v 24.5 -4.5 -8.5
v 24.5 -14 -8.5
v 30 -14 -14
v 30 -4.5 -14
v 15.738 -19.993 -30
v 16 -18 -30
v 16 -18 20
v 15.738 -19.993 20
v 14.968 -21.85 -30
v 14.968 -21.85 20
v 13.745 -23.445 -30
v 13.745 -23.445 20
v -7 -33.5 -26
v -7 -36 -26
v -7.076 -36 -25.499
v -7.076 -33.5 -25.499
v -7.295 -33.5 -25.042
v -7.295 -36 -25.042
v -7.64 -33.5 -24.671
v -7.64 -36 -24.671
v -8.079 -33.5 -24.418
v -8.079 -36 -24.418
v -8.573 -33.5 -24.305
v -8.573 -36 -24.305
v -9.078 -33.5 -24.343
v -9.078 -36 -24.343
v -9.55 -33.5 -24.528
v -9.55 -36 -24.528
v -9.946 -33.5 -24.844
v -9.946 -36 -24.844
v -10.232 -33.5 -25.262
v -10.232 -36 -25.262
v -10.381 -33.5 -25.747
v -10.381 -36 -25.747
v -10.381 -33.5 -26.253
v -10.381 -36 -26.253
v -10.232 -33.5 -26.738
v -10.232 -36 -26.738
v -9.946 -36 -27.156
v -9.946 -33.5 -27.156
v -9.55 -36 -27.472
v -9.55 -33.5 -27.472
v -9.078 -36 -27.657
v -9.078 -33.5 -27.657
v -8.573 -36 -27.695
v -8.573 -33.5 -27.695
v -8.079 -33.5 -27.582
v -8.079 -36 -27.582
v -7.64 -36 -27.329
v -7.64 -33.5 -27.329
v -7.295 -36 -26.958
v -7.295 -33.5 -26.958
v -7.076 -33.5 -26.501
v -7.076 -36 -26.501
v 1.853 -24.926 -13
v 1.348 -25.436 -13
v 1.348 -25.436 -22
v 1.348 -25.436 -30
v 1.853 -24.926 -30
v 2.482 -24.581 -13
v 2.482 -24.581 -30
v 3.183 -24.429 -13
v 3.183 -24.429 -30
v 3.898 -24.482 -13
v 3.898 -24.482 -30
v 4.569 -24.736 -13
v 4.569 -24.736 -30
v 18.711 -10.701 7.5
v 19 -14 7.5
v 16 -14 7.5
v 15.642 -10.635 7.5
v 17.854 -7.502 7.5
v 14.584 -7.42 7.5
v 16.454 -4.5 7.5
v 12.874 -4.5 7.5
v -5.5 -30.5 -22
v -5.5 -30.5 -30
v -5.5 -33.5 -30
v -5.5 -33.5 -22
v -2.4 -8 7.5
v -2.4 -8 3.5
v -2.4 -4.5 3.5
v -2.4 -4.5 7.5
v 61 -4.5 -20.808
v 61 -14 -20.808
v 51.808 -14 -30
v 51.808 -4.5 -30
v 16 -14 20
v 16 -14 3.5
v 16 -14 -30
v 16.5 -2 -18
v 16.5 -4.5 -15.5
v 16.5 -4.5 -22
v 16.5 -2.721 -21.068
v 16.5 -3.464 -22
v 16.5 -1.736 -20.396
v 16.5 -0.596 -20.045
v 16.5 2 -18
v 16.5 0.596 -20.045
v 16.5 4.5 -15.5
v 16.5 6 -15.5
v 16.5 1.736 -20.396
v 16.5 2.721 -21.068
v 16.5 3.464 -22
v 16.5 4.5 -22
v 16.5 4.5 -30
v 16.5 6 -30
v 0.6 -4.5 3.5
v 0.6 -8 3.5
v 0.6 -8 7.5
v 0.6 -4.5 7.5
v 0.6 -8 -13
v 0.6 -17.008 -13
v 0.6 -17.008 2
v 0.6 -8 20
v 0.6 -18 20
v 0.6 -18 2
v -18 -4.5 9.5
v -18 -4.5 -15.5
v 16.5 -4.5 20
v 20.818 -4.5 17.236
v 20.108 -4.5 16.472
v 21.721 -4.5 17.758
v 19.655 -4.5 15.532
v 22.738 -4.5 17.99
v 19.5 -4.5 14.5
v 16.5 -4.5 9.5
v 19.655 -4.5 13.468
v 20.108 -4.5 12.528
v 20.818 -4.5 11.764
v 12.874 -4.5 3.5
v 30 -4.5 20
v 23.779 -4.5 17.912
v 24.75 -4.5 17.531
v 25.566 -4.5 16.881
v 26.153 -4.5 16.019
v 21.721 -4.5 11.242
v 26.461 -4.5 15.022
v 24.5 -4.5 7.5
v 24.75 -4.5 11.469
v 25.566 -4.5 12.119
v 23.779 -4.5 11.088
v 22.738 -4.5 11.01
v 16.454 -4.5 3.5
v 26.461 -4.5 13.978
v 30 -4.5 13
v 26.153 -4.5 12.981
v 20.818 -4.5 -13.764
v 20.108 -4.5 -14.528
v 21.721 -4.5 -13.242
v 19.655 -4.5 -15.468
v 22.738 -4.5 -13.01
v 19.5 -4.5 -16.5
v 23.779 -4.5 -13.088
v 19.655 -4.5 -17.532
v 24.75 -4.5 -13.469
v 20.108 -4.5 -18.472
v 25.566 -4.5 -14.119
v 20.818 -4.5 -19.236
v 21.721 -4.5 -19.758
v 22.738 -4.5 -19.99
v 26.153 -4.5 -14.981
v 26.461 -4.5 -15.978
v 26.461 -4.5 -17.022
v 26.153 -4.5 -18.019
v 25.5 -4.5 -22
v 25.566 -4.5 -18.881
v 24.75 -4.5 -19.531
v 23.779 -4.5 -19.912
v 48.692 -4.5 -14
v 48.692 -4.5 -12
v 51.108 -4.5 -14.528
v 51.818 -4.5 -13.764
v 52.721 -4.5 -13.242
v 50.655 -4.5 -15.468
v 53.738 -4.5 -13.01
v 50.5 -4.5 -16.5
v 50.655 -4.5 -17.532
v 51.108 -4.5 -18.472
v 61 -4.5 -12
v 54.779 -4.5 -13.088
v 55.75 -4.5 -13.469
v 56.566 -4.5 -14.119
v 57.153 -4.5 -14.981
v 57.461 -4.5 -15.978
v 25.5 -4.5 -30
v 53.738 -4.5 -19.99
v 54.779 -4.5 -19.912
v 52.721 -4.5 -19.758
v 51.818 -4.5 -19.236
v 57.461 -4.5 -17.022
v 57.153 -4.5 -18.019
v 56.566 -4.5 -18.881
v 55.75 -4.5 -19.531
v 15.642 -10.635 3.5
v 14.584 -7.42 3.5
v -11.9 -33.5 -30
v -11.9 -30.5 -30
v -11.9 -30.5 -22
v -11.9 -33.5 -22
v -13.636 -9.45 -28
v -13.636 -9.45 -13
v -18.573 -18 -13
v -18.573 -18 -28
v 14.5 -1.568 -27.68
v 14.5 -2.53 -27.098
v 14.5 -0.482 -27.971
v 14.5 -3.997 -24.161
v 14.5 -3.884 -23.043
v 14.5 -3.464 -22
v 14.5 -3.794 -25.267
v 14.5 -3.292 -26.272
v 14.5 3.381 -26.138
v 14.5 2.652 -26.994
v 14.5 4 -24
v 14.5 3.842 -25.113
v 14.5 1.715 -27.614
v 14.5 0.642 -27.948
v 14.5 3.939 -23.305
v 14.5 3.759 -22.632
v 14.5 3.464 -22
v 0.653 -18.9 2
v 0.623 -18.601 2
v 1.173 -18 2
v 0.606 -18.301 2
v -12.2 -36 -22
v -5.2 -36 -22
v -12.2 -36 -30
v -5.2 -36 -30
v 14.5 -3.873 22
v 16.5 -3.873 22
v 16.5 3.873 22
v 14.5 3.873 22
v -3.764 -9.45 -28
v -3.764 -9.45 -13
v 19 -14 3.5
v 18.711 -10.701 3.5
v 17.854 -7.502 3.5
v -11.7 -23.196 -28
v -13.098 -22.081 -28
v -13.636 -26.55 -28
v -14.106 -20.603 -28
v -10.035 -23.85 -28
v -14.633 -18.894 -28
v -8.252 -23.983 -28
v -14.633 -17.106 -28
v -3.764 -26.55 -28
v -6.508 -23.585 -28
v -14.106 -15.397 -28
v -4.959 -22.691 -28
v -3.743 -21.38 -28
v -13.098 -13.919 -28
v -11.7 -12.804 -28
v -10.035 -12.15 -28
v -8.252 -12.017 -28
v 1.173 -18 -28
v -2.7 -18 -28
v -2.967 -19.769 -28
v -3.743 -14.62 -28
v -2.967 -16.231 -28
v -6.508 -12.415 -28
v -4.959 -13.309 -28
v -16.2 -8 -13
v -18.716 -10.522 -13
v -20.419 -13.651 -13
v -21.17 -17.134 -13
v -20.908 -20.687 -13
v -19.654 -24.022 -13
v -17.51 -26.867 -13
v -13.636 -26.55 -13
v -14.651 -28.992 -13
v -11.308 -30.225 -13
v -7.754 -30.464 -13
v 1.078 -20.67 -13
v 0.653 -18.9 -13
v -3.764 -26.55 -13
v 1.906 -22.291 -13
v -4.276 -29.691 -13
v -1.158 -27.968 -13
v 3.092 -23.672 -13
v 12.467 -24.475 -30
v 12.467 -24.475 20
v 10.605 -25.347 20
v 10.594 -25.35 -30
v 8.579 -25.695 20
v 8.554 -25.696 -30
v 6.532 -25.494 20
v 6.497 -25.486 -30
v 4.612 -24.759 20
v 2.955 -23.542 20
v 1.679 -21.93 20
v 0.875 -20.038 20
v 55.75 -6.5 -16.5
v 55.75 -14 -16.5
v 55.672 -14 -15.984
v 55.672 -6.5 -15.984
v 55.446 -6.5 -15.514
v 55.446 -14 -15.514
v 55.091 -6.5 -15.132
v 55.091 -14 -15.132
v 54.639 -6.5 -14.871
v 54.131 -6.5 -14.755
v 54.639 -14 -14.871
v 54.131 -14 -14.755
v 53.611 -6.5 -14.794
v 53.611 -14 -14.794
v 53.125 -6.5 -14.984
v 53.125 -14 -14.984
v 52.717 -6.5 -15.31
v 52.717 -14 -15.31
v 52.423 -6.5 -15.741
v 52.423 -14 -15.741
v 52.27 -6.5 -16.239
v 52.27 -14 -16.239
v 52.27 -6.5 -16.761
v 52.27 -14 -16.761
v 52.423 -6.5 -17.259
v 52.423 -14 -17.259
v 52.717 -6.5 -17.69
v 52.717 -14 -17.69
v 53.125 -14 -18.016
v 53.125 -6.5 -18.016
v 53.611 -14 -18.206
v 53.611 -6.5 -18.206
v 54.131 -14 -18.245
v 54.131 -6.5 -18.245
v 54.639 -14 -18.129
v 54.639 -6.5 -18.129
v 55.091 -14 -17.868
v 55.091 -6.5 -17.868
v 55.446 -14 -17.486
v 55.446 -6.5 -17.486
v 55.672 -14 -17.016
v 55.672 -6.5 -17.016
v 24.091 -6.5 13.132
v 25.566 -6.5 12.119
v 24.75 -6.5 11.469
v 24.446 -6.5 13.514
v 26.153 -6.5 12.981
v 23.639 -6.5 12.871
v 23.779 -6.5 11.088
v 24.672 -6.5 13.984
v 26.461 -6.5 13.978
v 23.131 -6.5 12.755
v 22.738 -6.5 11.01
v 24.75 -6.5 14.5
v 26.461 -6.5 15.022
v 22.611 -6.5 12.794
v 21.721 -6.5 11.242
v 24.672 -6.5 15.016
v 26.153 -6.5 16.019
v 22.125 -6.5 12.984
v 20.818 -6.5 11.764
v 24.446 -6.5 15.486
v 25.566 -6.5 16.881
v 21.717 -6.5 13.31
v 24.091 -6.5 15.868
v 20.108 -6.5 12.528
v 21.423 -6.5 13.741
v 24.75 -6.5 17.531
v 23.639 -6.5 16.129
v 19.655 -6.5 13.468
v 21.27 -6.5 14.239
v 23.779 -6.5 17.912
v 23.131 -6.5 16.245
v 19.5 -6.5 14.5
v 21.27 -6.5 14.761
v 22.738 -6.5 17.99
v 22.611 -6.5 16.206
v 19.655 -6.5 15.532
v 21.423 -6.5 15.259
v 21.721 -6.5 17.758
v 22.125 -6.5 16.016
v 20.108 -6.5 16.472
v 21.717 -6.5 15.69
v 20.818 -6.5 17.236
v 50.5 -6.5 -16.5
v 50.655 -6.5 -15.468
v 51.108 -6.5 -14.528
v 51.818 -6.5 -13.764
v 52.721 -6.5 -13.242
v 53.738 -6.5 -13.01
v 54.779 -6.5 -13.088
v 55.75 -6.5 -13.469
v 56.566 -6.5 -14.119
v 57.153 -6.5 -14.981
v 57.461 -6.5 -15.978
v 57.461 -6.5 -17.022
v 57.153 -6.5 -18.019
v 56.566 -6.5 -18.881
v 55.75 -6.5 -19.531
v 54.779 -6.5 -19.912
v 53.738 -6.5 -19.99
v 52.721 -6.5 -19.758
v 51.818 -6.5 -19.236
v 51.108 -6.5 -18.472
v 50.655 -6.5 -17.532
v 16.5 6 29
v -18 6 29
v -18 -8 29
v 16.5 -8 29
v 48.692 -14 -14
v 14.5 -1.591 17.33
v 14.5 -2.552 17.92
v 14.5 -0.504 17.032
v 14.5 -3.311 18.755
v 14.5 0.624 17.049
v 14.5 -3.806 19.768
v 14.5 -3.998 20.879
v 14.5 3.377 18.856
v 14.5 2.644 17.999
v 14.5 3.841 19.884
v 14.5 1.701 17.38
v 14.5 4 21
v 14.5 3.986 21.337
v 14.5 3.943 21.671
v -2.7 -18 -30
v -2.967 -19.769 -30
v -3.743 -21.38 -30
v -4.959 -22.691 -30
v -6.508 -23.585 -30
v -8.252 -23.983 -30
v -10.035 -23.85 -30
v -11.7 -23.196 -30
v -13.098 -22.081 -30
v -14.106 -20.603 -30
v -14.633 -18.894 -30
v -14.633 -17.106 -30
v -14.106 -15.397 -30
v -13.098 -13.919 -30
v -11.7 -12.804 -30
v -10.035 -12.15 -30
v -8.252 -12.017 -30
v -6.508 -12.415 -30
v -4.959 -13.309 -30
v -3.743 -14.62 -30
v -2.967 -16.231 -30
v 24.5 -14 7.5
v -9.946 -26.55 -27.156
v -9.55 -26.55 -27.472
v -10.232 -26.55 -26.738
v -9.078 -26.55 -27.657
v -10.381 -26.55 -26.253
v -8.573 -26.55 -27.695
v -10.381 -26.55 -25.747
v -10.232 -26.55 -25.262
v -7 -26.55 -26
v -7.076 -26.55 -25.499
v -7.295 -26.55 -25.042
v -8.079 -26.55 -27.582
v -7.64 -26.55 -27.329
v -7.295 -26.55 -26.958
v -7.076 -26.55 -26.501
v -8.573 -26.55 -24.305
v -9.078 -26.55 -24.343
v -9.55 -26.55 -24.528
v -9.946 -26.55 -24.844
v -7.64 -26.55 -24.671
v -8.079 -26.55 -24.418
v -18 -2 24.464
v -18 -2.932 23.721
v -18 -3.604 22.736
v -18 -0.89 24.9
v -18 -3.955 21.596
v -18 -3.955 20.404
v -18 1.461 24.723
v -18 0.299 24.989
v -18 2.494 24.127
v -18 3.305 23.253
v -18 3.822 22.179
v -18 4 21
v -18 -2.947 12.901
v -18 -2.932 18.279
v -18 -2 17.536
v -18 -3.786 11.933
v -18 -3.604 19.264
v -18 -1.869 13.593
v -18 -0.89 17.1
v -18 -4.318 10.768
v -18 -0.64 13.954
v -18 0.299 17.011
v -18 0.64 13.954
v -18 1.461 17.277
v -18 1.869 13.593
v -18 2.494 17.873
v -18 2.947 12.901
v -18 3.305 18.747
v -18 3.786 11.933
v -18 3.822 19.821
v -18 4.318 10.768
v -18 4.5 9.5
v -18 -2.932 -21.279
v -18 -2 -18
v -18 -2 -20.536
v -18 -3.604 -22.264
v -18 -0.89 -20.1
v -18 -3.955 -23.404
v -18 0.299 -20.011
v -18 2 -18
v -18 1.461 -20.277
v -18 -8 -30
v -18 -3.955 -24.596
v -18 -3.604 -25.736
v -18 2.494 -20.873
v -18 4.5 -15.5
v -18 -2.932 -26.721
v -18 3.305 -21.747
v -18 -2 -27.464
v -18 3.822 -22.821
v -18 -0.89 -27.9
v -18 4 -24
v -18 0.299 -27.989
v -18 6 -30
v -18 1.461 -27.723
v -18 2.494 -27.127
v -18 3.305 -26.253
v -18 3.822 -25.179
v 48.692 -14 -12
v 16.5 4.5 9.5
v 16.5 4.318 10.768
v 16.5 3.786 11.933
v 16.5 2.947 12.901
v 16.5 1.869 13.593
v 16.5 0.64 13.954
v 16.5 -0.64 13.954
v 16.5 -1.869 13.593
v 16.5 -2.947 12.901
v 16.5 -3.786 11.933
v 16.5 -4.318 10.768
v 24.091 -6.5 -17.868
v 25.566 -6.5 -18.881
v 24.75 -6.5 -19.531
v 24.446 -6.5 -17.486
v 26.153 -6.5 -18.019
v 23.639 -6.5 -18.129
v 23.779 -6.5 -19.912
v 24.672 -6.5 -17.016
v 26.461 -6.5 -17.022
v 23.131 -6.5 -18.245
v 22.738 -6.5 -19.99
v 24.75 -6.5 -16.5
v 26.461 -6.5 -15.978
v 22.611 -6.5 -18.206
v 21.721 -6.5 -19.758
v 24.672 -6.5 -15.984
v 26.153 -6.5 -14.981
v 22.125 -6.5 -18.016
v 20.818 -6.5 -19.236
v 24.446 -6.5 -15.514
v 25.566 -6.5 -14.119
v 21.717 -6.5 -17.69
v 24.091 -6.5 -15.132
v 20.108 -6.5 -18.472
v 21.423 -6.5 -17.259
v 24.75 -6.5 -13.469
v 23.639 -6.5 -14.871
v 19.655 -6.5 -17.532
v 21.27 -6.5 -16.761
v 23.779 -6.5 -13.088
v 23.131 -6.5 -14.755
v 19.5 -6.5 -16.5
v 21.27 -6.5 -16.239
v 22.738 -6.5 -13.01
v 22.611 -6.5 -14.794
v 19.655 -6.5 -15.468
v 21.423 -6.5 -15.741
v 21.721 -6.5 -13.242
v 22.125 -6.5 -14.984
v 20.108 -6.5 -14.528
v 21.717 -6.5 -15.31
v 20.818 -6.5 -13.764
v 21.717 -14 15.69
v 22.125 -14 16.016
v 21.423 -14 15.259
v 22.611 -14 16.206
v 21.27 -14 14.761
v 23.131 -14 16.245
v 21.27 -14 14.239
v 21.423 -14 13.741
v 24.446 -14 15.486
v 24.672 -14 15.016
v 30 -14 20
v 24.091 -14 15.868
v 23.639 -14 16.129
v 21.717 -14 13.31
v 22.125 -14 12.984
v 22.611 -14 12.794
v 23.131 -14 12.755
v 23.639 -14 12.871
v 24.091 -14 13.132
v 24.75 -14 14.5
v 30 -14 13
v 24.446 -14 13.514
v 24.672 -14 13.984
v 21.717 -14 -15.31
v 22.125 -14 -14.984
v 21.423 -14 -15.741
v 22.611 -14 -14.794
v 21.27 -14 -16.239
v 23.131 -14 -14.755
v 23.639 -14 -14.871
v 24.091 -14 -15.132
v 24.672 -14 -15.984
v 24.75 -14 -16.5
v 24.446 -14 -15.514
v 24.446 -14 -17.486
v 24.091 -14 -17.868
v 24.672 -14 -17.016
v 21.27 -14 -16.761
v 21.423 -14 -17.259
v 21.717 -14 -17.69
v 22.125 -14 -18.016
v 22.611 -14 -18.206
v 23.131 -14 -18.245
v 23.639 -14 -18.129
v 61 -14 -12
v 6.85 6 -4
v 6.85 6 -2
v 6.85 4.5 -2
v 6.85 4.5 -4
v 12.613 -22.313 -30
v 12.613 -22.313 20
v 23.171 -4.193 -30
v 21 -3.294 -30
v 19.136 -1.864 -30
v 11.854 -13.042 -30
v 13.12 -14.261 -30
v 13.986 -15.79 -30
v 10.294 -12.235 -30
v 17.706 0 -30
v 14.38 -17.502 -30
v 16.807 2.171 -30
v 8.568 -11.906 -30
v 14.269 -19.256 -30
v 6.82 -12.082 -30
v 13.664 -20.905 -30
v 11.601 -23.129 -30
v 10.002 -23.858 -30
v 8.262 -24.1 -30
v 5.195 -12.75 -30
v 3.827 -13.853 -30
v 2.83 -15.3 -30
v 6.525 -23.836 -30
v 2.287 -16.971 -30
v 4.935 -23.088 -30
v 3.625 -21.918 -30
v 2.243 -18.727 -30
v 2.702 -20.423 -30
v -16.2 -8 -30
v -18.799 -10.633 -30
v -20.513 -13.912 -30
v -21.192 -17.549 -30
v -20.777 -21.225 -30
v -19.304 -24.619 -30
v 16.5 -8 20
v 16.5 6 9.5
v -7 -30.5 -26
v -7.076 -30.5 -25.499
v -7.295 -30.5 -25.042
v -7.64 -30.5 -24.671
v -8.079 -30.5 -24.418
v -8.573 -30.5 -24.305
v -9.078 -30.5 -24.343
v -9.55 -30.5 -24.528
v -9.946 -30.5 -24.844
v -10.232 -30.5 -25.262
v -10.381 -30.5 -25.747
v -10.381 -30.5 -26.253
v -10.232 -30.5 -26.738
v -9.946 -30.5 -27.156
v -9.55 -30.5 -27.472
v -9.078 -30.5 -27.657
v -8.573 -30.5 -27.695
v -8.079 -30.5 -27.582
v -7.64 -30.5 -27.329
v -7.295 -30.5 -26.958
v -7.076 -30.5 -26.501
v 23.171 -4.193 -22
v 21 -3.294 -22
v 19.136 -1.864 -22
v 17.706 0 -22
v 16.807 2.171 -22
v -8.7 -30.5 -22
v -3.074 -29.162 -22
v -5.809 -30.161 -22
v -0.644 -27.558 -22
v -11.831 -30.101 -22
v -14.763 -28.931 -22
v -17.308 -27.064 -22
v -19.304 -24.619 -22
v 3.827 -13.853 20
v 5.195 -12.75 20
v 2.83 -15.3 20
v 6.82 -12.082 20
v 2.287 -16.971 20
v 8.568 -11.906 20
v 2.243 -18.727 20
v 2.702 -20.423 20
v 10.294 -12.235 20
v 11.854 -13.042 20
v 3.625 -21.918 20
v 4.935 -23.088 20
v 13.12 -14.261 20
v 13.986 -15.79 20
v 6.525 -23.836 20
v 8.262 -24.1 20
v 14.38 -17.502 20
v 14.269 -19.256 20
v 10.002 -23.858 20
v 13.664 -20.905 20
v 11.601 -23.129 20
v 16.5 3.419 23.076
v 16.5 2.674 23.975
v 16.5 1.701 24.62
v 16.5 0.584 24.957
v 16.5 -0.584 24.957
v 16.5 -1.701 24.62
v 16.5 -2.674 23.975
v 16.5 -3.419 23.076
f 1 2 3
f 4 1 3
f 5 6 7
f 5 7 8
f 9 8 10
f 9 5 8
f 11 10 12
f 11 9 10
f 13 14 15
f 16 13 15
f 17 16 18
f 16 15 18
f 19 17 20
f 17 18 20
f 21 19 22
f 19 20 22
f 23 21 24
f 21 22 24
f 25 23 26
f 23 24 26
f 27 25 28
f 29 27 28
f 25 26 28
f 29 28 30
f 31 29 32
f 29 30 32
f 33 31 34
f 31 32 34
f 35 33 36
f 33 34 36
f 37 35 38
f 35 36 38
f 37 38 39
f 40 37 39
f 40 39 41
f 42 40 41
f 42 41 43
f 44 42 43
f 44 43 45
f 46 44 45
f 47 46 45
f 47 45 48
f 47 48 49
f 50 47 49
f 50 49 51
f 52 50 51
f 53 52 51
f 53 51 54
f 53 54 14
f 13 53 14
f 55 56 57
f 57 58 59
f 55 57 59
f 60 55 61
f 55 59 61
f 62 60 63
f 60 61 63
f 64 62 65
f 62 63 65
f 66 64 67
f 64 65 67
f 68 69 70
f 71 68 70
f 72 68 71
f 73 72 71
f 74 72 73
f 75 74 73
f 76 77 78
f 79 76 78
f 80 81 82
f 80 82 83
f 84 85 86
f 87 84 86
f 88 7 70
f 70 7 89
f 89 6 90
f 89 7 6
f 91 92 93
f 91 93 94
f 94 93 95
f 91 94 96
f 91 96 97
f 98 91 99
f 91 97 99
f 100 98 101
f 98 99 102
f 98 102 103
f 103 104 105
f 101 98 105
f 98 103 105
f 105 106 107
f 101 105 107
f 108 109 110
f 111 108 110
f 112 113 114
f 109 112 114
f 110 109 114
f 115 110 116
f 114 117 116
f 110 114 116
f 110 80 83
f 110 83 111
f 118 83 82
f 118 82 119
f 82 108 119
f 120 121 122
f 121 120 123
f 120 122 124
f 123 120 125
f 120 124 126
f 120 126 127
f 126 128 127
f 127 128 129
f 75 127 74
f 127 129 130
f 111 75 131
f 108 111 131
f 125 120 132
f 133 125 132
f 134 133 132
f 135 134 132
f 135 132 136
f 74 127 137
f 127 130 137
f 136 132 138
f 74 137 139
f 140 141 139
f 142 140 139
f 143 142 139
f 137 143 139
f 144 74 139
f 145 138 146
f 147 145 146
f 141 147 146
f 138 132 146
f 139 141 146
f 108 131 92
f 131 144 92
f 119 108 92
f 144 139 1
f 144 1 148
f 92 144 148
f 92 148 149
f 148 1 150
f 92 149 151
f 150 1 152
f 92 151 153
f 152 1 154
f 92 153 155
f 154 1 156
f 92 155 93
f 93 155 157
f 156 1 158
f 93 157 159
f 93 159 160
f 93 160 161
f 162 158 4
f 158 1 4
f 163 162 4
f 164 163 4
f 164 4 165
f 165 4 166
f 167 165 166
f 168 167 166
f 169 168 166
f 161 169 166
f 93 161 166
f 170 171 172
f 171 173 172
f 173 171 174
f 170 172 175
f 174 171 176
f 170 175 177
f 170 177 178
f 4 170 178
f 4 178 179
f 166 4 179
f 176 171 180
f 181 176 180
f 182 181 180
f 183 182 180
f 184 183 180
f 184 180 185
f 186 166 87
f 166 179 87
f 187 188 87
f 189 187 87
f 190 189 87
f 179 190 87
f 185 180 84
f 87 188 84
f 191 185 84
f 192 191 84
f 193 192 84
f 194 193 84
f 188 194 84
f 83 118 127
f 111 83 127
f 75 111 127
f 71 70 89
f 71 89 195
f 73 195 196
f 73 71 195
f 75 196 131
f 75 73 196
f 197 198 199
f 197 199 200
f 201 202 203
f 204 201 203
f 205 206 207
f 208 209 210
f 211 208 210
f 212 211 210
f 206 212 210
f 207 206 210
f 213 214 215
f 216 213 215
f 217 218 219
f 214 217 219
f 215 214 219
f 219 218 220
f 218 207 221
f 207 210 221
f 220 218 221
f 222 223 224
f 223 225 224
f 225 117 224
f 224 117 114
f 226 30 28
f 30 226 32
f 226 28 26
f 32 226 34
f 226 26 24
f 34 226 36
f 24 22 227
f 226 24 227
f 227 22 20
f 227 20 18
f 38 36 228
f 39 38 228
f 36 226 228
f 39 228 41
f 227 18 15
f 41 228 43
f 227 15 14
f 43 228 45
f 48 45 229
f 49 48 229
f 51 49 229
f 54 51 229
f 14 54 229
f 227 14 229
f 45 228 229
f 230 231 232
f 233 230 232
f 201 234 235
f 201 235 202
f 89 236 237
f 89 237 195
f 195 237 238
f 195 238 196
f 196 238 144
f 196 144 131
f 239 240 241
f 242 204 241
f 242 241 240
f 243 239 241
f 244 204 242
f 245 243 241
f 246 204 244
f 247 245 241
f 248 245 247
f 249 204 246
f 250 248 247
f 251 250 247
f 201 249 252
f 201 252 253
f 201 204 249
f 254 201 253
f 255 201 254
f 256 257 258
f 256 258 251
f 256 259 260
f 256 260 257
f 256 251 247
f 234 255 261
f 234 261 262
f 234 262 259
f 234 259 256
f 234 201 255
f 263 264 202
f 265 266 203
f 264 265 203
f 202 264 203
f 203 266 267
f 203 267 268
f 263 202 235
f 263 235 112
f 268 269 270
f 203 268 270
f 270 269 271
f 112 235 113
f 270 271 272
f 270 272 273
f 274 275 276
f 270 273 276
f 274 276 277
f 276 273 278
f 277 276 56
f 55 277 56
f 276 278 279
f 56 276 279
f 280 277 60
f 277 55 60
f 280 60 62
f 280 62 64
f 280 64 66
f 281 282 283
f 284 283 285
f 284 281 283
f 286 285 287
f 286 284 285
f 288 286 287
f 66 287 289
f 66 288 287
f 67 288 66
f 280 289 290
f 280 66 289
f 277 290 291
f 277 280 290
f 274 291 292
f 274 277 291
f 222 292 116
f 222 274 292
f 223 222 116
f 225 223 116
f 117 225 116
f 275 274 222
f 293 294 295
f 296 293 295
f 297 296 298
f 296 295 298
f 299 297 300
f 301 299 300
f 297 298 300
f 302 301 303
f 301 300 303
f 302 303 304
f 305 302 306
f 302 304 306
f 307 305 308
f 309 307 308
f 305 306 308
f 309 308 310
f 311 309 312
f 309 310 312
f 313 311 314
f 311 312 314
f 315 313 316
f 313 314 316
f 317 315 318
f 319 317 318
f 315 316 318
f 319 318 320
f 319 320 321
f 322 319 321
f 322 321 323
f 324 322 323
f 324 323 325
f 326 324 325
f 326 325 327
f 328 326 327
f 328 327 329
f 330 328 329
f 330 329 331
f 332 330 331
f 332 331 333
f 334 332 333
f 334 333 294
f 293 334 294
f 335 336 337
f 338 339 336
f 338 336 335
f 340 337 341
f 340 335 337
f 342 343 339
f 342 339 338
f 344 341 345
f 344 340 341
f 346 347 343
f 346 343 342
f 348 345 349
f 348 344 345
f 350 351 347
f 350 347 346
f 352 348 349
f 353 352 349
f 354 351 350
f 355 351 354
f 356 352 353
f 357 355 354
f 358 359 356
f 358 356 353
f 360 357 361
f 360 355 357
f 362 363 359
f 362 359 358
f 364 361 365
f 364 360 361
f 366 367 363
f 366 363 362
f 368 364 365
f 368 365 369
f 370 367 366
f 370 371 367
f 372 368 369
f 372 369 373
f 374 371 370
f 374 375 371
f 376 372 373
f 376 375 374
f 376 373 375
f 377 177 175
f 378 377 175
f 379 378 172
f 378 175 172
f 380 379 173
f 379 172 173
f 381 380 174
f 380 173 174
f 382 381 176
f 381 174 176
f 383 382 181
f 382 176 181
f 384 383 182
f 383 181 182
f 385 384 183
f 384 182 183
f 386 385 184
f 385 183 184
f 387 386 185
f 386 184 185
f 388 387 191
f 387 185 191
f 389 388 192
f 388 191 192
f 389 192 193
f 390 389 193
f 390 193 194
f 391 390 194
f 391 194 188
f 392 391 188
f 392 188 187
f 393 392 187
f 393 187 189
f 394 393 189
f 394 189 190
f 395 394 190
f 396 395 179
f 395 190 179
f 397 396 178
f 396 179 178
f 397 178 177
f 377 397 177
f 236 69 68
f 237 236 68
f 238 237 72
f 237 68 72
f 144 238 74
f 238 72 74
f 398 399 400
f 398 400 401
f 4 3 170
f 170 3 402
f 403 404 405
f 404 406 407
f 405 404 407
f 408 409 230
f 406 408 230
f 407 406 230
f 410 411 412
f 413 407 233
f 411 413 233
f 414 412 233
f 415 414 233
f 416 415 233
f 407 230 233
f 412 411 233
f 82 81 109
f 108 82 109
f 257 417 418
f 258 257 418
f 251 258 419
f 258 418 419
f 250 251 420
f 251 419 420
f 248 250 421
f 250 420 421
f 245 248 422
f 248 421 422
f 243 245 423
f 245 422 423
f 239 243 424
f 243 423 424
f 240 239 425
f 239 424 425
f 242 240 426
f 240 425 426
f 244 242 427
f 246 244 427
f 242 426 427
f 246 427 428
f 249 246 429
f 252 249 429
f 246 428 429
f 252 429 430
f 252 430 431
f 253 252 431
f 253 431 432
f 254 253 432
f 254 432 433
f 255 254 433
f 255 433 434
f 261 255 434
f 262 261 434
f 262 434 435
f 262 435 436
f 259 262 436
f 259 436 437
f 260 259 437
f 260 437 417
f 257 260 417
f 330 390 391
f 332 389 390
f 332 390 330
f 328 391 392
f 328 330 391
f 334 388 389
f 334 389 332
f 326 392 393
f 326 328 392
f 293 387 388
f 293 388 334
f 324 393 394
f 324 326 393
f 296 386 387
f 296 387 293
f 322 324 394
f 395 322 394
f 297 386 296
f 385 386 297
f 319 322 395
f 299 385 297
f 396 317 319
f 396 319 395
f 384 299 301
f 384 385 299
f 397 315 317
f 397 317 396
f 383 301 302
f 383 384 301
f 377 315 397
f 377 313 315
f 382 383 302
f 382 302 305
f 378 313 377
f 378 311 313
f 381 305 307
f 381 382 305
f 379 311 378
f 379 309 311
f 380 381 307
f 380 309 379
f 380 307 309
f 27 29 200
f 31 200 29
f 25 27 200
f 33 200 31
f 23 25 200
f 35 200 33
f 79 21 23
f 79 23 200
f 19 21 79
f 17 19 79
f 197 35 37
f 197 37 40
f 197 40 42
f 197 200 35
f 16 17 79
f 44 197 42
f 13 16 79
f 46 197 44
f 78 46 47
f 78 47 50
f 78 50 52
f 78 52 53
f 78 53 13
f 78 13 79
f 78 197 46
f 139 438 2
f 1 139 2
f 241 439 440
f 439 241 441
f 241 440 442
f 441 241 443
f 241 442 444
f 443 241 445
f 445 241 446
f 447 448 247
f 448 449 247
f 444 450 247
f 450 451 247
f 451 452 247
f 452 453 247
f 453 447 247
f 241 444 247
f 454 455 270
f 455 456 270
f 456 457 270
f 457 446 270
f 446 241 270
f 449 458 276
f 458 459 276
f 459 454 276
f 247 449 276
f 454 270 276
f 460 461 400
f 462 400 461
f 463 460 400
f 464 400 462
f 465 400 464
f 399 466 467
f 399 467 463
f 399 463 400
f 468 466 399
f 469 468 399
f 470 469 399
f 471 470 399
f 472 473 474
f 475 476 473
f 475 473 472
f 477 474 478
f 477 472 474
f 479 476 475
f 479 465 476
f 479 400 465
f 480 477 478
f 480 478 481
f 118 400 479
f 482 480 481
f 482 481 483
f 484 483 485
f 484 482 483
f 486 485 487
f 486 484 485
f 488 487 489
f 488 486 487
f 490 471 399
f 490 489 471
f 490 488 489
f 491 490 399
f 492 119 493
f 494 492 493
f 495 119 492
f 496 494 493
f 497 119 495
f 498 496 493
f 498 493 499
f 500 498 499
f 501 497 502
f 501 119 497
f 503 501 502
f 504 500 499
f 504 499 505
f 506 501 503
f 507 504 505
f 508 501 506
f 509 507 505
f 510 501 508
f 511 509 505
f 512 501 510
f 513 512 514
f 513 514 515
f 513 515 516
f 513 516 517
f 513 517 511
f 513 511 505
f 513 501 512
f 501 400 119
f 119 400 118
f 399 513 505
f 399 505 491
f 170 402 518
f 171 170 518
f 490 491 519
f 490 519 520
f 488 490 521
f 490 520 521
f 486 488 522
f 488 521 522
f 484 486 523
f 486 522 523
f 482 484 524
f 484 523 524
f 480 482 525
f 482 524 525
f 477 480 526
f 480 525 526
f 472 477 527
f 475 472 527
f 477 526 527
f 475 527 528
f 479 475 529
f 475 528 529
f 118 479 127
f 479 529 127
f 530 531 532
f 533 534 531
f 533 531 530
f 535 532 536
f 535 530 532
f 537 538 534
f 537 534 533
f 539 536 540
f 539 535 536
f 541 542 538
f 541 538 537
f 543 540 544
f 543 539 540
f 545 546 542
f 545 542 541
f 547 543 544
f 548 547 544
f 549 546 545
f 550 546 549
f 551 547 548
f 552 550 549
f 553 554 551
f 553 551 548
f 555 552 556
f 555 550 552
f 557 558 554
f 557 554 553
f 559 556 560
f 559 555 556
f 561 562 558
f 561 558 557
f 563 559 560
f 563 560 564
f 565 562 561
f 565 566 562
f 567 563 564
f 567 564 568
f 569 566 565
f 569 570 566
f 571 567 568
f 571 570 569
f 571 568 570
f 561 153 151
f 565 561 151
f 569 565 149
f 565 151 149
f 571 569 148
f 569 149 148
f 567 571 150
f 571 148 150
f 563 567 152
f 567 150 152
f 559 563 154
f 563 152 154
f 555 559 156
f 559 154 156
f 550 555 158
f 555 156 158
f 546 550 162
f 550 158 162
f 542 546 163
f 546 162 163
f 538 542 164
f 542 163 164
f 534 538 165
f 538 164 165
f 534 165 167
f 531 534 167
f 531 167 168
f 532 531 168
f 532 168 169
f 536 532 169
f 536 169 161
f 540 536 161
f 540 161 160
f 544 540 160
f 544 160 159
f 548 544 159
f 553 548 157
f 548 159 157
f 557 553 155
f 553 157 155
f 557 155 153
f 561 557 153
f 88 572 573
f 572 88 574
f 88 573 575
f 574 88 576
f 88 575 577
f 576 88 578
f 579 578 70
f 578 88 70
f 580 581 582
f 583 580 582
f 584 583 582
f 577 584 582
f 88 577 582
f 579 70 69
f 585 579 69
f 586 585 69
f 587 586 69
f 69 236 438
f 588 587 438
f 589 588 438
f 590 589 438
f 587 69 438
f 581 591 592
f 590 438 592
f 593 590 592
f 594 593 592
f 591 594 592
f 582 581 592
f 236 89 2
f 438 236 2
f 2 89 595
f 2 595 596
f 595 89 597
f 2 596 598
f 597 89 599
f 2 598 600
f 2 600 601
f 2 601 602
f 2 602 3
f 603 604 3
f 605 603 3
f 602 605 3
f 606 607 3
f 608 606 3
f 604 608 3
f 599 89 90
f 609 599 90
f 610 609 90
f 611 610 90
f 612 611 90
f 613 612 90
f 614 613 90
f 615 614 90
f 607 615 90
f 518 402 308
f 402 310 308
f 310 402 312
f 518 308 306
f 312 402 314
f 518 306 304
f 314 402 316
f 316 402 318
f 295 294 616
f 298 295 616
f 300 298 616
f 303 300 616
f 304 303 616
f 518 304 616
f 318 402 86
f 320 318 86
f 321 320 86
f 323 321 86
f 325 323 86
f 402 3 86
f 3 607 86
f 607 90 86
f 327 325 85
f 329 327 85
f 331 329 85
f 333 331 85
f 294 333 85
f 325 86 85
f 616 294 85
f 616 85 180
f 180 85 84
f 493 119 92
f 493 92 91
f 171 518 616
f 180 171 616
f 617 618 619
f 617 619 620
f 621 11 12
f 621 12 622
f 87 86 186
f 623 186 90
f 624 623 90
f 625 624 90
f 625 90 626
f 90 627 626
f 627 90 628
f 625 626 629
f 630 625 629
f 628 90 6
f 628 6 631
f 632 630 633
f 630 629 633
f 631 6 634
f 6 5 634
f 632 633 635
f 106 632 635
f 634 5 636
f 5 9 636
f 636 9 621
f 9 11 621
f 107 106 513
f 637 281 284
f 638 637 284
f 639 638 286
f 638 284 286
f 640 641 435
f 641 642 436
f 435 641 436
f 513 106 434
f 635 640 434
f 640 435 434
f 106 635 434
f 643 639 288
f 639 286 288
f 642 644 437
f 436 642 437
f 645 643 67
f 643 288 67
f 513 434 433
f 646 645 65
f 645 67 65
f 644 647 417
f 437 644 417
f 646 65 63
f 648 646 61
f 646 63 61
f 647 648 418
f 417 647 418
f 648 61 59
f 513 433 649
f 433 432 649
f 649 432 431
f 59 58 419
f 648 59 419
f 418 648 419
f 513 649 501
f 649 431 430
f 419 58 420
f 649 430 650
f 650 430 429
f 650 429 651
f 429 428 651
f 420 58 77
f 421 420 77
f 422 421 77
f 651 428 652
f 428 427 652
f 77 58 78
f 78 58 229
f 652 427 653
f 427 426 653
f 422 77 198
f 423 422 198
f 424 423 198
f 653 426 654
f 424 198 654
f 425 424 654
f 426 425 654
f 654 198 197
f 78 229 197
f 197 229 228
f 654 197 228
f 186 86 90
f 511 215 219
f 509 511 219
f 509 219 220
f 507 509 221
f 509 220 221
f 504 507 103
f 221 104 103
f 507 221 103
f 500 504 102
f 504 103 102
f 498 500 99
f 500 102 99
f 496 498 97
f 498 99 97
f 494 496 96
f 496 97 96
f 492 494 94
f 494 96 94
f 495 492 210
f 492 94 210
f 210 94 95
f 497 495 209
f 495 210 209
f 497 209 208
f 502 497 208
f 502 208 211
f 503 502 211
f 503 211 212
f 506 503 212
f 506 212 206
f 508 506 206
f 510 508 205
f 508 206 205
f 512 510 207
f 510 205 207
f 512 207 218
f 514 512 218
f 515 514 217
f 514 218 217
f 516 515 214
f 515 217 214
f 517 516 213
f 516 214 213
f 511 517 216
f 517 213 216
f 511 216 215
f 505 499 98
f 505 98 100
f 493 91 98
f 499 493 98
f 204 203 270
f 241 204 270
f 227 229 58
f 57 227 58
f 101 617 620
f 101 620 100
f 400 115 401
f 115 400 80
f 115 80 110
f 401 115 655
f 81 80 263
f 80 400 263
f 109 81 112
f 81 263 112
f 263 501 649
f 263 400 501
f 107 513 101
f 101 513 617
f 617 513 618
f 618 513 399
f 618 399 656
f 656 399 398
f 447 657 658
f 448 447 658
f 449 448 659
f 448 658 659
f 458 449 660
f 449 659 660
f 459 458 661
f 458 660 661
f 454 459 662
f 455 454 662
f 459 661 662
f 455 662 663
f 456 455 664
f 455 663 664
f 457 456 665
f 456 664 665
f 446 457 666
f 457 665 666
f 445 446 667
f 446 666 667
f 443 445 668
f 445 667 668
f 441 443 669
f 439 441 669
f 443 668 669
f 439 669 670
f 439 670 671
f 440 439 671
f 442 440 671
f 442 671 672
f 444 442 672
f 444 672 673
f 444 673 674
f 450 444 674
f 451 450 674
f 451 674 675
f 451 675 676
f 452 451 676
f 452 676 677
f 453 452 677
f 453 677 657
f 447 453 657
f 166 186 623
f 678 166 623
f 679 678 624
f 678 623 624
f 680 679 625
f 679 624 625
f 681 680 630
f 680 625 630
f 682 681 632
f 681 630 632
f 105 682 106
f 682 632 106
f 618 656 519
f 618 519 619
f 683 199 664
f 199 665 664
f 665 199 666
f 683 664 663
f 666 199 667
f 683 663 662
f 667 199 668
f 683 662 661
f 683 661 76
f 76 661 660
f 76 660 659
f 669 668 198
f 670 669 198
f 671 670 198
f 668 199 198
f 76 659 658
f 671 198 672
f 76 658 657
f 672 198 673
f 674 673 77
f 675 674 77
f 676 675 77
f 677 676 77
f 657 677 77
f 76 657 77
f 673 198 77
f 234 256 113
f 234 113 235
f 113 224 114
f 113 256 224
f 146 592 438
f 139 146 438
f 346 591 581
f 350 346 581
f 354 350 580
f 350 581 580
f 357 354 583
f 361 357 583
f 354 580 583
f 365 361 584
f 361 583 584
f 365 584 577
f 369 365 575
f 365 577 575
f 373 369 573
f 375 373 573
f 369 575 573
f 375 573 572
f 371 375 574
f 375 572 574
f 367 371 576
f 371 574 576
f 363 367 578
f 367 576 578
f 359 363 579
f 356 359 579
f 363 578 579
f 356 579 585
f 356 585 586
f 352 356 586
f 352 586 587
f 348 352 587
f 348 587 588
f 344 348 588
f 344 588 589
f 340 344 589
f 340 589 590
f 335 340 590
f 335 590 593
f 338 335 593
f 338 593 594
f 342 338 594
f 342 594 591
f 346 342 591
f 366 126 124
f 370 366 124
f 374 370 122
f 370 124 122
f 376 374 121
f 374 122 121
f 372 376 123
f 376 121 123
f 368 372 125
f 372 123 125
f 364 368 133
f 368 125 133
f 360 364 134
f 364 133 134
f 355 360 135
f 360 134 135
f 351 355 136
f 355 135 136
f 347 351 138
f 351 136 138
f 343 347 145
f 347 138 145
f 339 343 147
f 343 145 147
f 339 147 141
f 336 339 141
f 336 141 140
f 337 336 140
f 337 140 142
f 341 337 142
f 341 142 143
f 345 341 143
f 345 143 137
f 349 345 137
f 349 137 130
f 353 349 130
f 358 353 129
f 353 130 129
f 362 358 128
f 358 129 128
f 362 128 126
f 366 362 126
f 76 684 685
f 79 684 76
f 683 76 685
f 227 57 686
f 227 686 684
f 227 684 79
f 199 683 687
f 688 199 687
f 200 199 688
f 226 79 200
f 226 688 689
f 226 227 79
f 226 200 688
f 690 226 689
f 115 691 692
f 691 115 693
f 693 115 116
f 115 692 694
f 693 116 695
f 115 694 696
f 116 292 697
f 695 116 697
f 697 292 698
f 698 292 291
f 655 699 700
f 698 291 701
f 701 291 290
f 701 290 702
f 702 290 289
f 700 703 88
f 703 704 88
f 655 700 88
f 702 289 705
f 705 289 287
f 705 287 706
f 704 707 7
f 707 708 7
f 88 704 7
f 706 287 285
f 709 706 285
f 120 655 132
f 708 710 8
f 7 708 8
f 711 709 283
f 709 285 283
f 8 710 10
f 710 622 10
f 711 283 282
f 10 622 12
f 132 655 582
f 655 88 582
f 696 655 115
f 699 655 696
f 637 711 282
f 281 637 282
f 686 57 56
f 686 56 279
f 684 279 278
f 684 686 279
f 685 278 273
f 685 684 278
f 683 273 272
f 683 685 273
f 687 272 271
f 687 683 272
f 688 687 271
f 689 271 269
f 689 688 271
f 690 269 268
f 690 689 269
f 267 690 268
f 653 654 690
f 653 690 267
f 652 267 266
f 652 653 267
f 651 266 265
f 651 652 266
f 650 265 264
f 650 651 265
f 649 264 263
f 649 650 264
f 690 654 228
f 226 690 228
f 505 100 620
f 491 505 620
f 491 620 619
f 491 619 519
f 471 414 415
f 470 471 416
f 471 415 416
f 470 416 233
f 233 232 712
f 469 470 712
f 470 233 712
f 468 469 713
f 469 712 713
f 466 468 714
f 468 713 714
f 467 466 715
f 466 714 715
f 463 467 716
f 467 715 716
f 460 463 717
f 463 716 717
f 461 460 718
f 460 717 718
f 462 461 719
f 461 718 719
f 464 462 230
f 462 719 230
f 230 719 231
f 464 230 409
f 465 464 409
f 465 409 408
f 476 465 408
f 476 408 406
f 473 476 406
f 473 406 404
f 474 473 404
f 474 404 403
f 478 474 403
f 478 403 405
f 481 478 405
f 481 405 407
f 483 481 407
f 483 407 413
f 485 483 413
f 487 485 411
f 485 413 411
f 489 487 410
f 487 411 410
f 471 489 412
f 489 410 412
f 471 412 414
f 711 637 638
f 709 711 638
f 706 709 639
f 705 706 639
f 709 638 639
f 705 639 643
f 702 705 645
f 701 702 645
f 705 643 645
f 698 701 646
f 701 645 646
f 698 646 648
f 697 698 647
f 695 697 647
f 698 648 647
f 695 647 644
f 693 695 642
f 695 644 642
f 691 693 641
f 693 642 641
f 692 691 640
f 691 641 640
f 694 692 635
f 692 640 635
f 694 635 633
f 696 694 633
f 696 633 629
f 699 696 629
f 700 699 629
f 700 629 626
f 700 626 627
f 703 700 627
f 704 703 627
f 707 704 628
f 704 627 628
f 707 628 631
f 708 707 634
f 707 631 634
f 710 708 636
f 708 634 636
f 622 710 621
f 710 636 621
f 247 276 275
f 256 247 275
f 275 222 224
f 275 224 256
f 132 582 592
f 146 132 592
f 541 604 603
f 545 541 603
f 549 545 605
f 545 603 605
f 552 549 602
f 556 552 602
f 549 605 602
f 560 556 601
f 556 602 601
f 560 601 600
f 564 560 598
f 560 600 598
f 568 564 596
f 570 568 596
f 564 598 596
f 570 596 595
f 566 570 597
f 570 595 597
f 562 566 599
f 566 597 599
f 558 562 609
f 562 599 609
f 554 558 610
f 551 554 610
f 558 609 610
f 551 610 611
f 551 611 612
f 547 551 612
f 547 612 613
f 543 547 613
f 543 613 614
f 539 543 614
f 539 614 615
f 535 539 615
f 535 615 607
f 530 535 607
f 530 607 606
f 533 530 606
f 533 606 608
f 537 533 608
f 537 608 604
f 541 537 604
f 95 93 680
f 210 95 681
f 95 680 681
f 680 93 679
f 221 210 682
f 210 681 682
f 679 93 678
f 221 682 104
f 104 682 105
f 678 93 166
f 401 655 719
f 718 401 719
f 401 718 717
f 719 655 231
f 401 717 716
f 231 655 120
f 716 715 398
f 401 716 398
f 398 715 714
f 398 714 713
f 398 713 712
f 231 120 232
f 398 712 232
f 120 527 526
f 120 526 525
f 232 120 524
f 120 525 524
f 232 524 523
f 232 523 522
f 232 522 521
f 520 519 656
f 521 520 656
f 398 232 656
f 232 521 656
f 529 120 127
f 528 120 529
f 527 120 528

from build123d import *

# Parameters (mm, degrees)
BOX_W           = 34.5
BOX_H           = 16
BOX_DEPTH       = 59
SKETCH_R        = 4
POCKET_DEPTH    = 34.501
POCKET001_DEPTH = 3.5000000001
BOX001_W        = 45
BOX001_H        = 9.5
BOX001_DEPTH    = 50
SKETCH008_R     = 1.75
POCKET002_DEPTH = 9.5010000001
PAD_DEPTH       = 8
PAD001_DEPTH    = 2
SKETCH009_R     = 3.5
POCKET003_DEPTH = 2
PAD002_DEPTH    = 50
SKETCH013_R     = 6
PAD003_DEPTH    = 17
SKETCH019_W     = 9
SKETCH019_H     = 5.5
PAD004_DEPTH    = 2
SKETCH015_W     = 3
SKETCH015_H     = 4
GROOVE_ANGLE    = 40
SKETCH016_W     = 3
SKETCH016_H     = 4
POCKET004_DEPTH = 5
SKETCH020_W     = 6.4
SKETCH020_H     = 3
PAD005_DEPTH    = 8
SKETCH021_R     = 1.7
POCKET005_DEPTH = 13
POCKET006_DEPTH = 15
SKETCH023_W     = 34.5
SKETCH023_H     = 2
POCKET007_DEPTH = 100


with BuildPart() as pocket001:
    # Box → Box (new body)
    with BuildSketch(Plane(origin=(-18, -8, -30), x_dir=(1, 0, 0), z_dir=(0, 0, 1))):
        with Locations((17.25, 8)):
            Rectangle(BOX_W, BOX_H)
    extrude(amount=BOX_DEPTH)

    # Sketch → Pocket (cut, through all)
    with BuildSketch(Plane(origin=(16.5, -8, -30), x_dir=(0, 1, 0), z_dir=(1, 0, 0))):
        with Locations((8, 51)):
            Circle(SKETCH_R)
        with Locations((8, 6)):
            Circle(SKETCH_R)
        with BuildLine():
            ThreePointArc((12.5, 39.4999793754), (8.0000103123, 44), (3.5, 39.5))
            Line((3.5, 39.5), (3.5, 14.5))
            Line((3.5, 14.5), (6, 12))
            Line((6, 12), (10, 12))
            Line((10, 12), (12.5, 14.5))
            Line((12.5, 14.5), (12.5, 39.4999793754))
        make_face()
    extrude(amount=-POCKET_DEPTH, mode=Mode.SUBTRACT)

    # Sketch007 → Pocket001 (cut)
    with BuildSketch(Plane(origin=(-18, 8, -30), x_dir=(-1, 0, 0), z_dir=(0, 1, 0))):
        Polygon((-34.5, 39.4999793754), (-24.8503628945, 27.9999896877), (-24.8503628945, 25.9999896877), (-34.5, 14.5), align=None)
    extrude(amount=-POCKET001_DEPTH, mode=Mode.SUBTRACT)


with BuildPart() as pocket007:
    # Box001 → Box001 (new body)
    with BuildSketch(Plane(origin=(16, -14, -30), x_dir=(1, 0, 0), z_dir=(0, 0, 1))):
        with Locations((22.5, 4.75)):
            Rectangle(BOX001_W, BOX001_H)
    extrude(amount=BOX001_DEPTH)

    # Sketch008 → Pocket002 (cut, through all)
    with BuildSketch(Plane(origin=(16, -14, -30), x_dir=(1, 0, 0), z_dir=(0, -1, 0))):
        with Locations((7, 44.5)):
            Circle(SKETCH008_R)
        with Locations((7, 13.5)):
            Circle(SKETCH008_R)
        with Locations((38, 13.5)):
            Circle(SKETCH008_R)
        Polygon((14, 50), (14, 43), (8.5, 37.5), (8.5, 21.5), (14, 16), (32.692131, 16), (32.692131, 18), (45, 18), (45, 50), align=None)
        Polygon((45, 9.1923881554), (35.8076118446, 0), (45, 0), align=None)
    extrude(amount=-POCKET002_DEPTH, mode=Mode.SUBTRACT)

    # Fusion: union Pocket001
    add(pocket001.part)

    # Sketch010 → Pad (new body)
    with BuildSketch(Plane(origin=(0, 0, -30), x_dir=(1, 0, 0), z_dir=(0, 0, -1))):
        with BuildLine():
            ThreePointArc((25.4999662688, 4.4999999999), (19.1360389694, 1.8639610307), (16.5000000001, -4.4999662687))
            Line((16.5000000001, -4.4999662687), (16.5000000001, 4.4999999999))
            Line((16.5000000001, 4.4999999999), (25.4999662688, 4.4999999999))
        make_face()
    extrude(amount=-PAD_DEPTH)

    # Sketch011 → Pad001 (new body)
    with BuildSketch(Plane.YZ.offset(16.5)):
        with BuildLine():
            ThreePointArc((-3.4641016151, -22), (0, -28), (3.4641016151, -22))
            Line((-3.4641016151, -22), (3.4641016151, -22))
        make_face()
    extrude(amount=-PAD001_DEPTH)

    # Sketch009 → Pocket003 (cut)
    with BuildSketch(Plane(origin=(0, -4.5, 0), x_dir=(-1, 0, 0), z_dir=(0, 1, 0))):
        with Locations((-23, 14.5)):
            Circle(SKETCH009_R)
        with Locations((-54, -16.5)):
            Circle(SKETCH009_R)
        with Locations((-23, -16.5)):
            Circle(SKETCH009_R)
    extrude(amount=-POCKET003_DEPTH, mode=Mode.SUBTRACT)

    # Sketch012 → Pad002 (new body)
    with BuildSketch(Plane(origin=(0, 0, -30), x_dir=(1, 0, 0), z_dir=(0, 0, -1))):
        with BuildLine():
            ThreePointArc((15.9999999999, 18.0000351724), (15.4138656704, 20.9466786767), (13.7447222151, 23.4447222151))
            Line((13.7447222151, 23.4447222151), (12.6133513652, 22.3133513652))
            ThreePointArc((11.6013945082, 23.1294048681), (4.4708258711, 13.2515870556), (12.6133513652, 22.3133513652))
            Line((11.6013945082, 23.1294048681), (12.4673340514, 24.4748225384))
            ThreePointArc((12.4673340514, 24.4748225384), (4.6120940547, 24.759389746), (0.6000000001, 18.0000351024))
            Line((0.6000000001, 18.0000351024), (0.6000000001, 8))
            Line((0.6000000001, 8), (15.9999999999, 8))
            Line((15.9999999999, 18.0000351724), (15.9999999999, 8))
        make_face()
    extrude(amount=-PAD002_DEPTH)

    # Sketch013 → Pad003 (new body)
    with BuildSketch(Plane(origin=(0, 0, -30), x_dir=(1, 0, 0), z_dir=(0, 0, -1))):
        with BuildLine():
            ThreePointArc((1.3480393737, 25.435516441), (-17.5103595019, 26.8672185857), (-16.2, 8))
            Line((-16.2, 8), (0.6000000001, 8))
            Line((0.6000000001, 8), (0.6, 18.0000060082))
            ThreePointArc((4.5689954494, 24.7356963295), (1.6660458786, 21.9090475457), (0.6, 18.0000060082))
            ThreePointArc((1.3480393737, 25.435516441), (2.8268537634, 24.4796180457), (4.5689954493, 24.7356963295))
        make_face()
        with Locations((-8.7, 18)):
            Circle(SKETCH013_R, mode=Mode.SUBTRACT)
    extrude(amount=-PAD003_DEPTH)

    # Sketch019 → Pad004 (new body)
    with BuildSketch(Plane.YZ.offset(16.5)):
        with Locations((0, 19.25)):
            Rectangle(SKETCH019_W, SKETCH019_H)
    extrude(amount=-PAD004_DEPTH)

    # Sketch015 → Groove (revolve, cut)
    with BuildSketch(Plane.XZ.offset(14)):
        with Locations((17.5, 5.5)):
            Rectangle(SKETCH015_W, SKETCH015_H)
    revolve(axis=Axis((0, -14, 0), (0, 0, 1)), revolution_arc=GROOVE_ANGLE, mode=Mode.SUBTRACT)

    # Sketch016 → Pocket004 (cut)
    with BuildSketch(Plane.XZ.offset(8)):
        with Locations((-0.8999999999, 5.5)):
            Rectangle(SKETCH016_W, SKETCH016_H)
    extrude(amount=-POCKET004_DEPTH, mode=Mode.SUBTRACT)

    # Sketch020 → Pad005 (new body)
    with BuildSketch(Plane(origin=(0, 0, -30), x_dir=(1, 0, 0), z_dir=(0, 0, -1))):
        Polygon((-19.3039162536, 24.6186826549), (-12.2, 36), (-5.2, 36), (1.3480393737, 25.435516441), align=None)
        with Locations((-8.7, 32)):
            Rectangle(SKETCH020_W, SKETCH020_H, mode=Mode.SUBTRACT)
    extrude(amount=-PAD005_DEPTH)

    # Sketch021 → Pocket005 (cut)
    with BuildSketch(Plane.XZ.offset(36)):
        with Locations((-8.7, -26)):
            Circle(SKETCH021_R)
    extrude(amount=-POCKET005_DEPTH, mode=Mode.SUBTRACT)

    # Sketch022 → Pocket006 (cut, symmetric)
    with BuildSketch(Plane.XY.offset(-13)):
        Polygon((-3.7636551984, -26.55), (1.1726896031, -18), (-3.7636551984, -9.45), (-13.6363448016, -9.45), (-18.5726896031, -18), (-13.6363448016, -26.55), align=None)
    extrude(amount=POCKET006_DEPTH, both=True, mode=Mode.SUBTRACT)

    # Sketch023 → Pocket007 (cut)
    with BuildSketch(Plane.XY.offset(29)):
        with Locations((-0.75, 7)):
            Rectangle(SKETCH023_W, SKETCH023_H)
    extrude(amount=-POCKET007_DEPTH, mode=Mode.SUBTRACT)


solid = pocket007.part
